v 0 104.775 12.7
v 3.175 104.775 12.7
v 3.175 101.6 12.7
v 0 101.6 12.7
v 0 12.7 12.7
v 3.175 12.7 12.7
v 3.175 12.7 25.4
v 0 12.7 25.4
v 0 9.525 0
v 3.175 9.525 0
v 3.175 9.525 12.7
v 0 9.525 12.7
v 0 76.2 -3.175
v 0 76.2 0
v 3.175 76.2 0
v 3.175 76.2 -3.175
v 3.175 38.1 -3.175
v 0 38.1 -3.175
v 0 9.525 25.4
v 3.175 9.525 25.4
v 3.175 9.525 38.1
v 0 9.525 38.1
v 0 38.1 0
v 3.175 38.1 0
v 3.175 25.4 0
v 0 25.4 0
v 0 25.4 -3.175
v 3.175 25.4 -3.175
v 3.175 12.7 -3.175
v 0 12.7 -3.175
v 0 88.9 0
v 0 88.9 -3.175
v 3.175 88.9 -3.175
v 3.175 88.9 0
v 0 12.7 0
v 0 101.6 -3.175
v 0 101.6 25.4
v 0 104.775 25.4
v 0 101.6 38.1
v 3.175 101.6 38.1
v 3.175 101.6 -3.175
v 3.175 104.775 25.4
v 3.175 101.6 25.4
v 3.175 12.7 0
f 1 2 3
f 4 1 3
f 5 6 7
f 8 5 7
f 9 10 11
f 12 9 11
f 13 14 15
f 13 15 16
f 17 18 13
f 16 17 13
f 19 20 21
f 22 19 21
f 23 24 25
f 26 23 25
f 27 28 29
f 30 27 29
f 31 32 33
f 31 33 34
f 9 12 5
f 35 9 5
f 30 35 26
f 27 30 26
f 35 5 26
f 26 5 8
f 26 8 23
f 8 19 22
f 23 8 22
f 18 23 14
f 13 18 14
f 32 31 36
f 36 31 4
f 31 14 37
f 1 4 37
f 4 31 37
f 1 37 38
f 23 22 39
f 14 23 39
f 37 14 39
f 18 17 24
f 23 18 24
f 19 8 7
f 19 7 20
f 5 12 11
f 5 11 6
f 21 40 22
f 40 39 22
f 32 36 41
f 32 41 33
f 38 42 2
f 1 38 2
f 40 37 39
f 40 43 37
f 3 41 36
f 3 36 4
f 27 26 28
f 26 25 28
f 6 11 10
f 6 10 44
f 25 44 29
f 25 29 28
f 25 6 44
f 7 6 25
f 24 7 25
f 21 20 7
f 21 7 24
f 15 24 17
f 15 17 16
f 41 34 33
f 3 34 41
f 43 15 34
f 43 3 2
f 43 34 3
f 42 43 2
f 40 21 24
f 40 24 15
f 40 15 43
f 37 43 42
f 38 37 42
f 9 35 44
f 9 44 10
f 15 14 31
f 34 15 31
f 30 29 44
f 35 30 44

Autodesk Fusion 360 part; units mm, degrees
sketch "Sketch1" plane through (0, 0, 0) normal (1, 0, 0) x (0, 1, 0)
  line L0 (0, 0) -> (101.6, 0)
  line L1 (101.6, 0) -> (101.6, 38.1)
  line L2 (101.6, 38.1) -> (0, 38.1)
  line L3 (0, 38.1) -> (0, 0)
  line L4 (0, 0) -> (0, -3.175)
  line L5 (0, -3.175) -> (12.7, -3.175)
  line L6 (12.7, -3.175) -> (12.7, 0)
  line L7 (12.7, 0) -> (25.4, 0)
  line L8 (25.4, 0) -> (25.4, -3.175)
  line L9 (25.4, -3.175) -> (38.1, -3.175)
  line L10 (38.1, -3.175) -> (38.1, 0)
  line L11 (101.6, 0) -> (101.6, -3.175)
  line L12 (101.6, -3.175) -> (88.9, -3.175)
  line L13 (88.9, -3.175) -> (88.9, 0)
  line L14 (88.9, 0) -> (76.2, 0)
  line L15 (76.2, 0) -> (76.2, -3.175)
  line L16 (76.2, -3.175) -> (63.5, -3.175)
  line L17 (63.5, -3.175) -> (63.5, 0)
  line L18 (101.6, 0) -> (104.775, 0)
  line L19 (104.775, 0) -> (104.775, 12.7)
  line L20 (104.775, 12.7) -> (101.6, 12.7)
  line L21 (101.6, 38.1) -> (104.775, 38.1)
  line L22 (104.775, 38.1) -> (104.775, 25.4)
  line L23 (104.775, 25.4) -> (101.6, 25.4)
  line L24 (0, 38.1) -> (-3.175, 38.1)
  line L25 (-3.175, 38.1) -> (-3.175, 25.4)
  line L26 (-3.175, 25.4) -> (0, 25.4)
  line L27 (0, 0) -> (-3.175, 0)
  line L28 (-3.175, 0) -> (-3.175, 12.7)
  line L29 (-3.175, 12.7) -> (0, 12.7)
  dimension "d1" = 101.6
  dimension "d2" = 38.1
  dimension "d3" = 3.175
  dimension "d4" = 12.7
  dimension "d5" = 12.7
  dimension "d6" = 3.175
  dimension "d7" = 12.7
  dimension "d8" = 3.175
  dimension "d9" = 12.7
  dimension "d10" = 12.7
  dimension "d11" = 3.175
  dimension "d12" = 12.7
  dimension "d13" = 3.175
  dimension "d14" = 12.7
  dimension "d15" = 3.175
  dimension "d16" = 12.7
  dimension "d17" = 3.175
  dimension "d18" = 12.7
  dimension "d19" = 3.175
  dimension "d20" = 12.7
extrude "Extrude1" add sketch "Sketch1" along normal blind 3.175
sketch "Sketch2" plane through (3.175, 0, 0) normal (1, 0, 0) x (0, 1, 0)
  line L0 (0, 0) -> (0, -3.175)
  line L1 (0, -3.175) -> (12.7, -3.175)
  line L2 (12.7, -3.175) -> (12.7, 0)
  line L3 (12.7, 0) -> (25.4, 0)
  line L4 (25.4, 0) -> (25.4, -3.175)
  line L5 (25.4, -3.175) -> (38.1, -3.175)
  line L6 (38.1, -3.175) -> (38.1, 0)
  line L7 (38.1, 0) -> (63.5, 0)
  line L8 (63.5, 0) -> (63.5, -3.175)
  line L9 (63.5, -3.175) -> (76.2, -3.175)
  line L10 (76.2, -3.175) -> (76.2, 0)
  line L11 (76.2, 0) -> (88.9, 0)
  line L12 (88.9, 0) -> (88.9, -3.175)
  line L13 (88.9, -3.175) -> (101.6, -3.175)
  line L14 (101.6, -3.175) -> (101.6, 0)
  line L15 (101.6, 0) -> (104.775, 0)
  line L16 (104.775, 0) -> (104.775, 12.7)
  line L17 (104.775, 12.7) -> (101.6, 12.7)
  line L18 (101.6, 12.7) -> (101.6, 25.4)
  line L19 (101.6, 25.4) -> (104.775, 25.4)
  line L20 (104.775, 25.4) -> (104.775, 38.1)
  line L21 (104.775, 38.1) -> (-3.175, 38.1)
  line L22 (-3.175, 38.1) -> (-3.175, 25.4)
  line L23 (-3.175, 25.4) -> (0, 25.4)
  line L24 (0, 25.4) -> (0, 12.7)
  line L25 (0, 12.7) -> (-3.175, 12.7)
  line L26 (-3.175, 12.7) -> (-3.175, 0)
  line L27 (-3.175, 0) -> (0, 0)
  line L28 (50.8, 0) -> (63.5, 0)
  line L29 (63.5, 0) -> (63.5, -3.175)
  line L30 (63.5, -3.175) -> (76.2, -3.175)
  line L31 (76.2, -3.175) -> (76.2, 0)
  line L32 (76.2, 0) -> (88.9, 0)
  line L33 (88.9, -3.175) -> (88.9, 0)
  line L34 (88.9, -3.175) -> (101.6, -3.175)
  line L35 (101.6, -3.175) -> (101.6, 0)
  line L36 (104.775, 0) -> (104.775, 12.7)
  line L37 (104.775, 12.7) -> (101.6, 12.7)
  line L38 (101.6, 12.7) -> (101.6, 25.4)
  line L39 (104.775, 25.4) -> (104.775, 38.1)
  line L40 (104.775, 38.1) -> (50.8, 38.1)
  line L41 (63.5, 0) -> (57.15, 0)
  line L42 (50.8, 38.1) -> (53.975, 38.1)
  line L43 (53.975, 38.1) -> (57.15, 38.1)
  line L44 (57.15, 38.1) -> (57.15, 0)
  line L45 (57.15, 38.1) -> (57.15, 0)
  line L46 (25.4, -3.175) -> (12.7, -3.175)
  line L47 (9.525, 25.4) -> (9.525, 38.1)
  line L48 (9.525, 12.7) -> (12.7, 12.7)
  line L49 (12.7, 12.7) -> (12.7, 25.4)
  line L50 (9.525, 0) -> (9.525, 12.7)
  line L51 (12.7, -3.175) -> (12.7, 0)
  line L52 (12.7, 0) -> (9.525, 0)
  line L53 (12.7, 25.4) -> (9.525, 25.4)
  line L54 (9.525, 12.7) -> (12.7, 12.7)
  line L55 (50.8, -3.175) -> (38.1, -3.175)
  line L56 (9.525, 0) -> (9.525, 12.7)
  line L57 (9.525, 25.4) -> (9.525, 38.1)
  line L58 (38.1, 0) -> (25.4, 0)
  line L59 (38.1, -3.175) -> (38.1, 0)
  line L60 (50.8, 0) -> (50.8, -3.175)
  line L61 (12.7, -3.175) -> (12.7, 0)
  line L62 (25.4, 0) -> (25.4, -3.175)
  line L63 (50.8, 0) -> (50.8, -3.175)
  line L64 (50.8, -3.175) -> (38.1, -3.175)
  line L65 (38.1, -3.175) -> (38.1, 0)
  line L66 (25.4, -3.175) -> (25.4, 0)
  line L67 (25.4, -3.175) -> (12.7, -3.175)
  line L68 (12.7, 12.7) -> (12.7, 25.4)
  line L69 (38.1, 0) -> (25.4, 0)
  line L70 (50.8, -3.175) -> (63.5, -3.175)
  point P0 (50.8, 0)
  dimension "d23" = 3.175
  dimension "d24" = 3.175
extrude "Extrude5" add sketch "Sketch2" against normal blind 3.175 contours L6 L7 L55 L59 L60 L63 L64 L65 | L7 L8 L28 L29 L41 L60 L63 L70
extrude "Extrude3" cut sketch "Sketch2" against normal blind 30.48 contours L0 L1 L2 L21 L22 L23 L24 L25 L26 L27 L47 L48 L49 L50 L51 L52 L53 L54 L56 L57 L61 L68
extrude "Extrude2" cut sketch "Sketch2" against normal blind 15.24 contours L0 L1 L2 L21 L22 L23 L24 L25 L26 L27 L47 L48 L49 L50 L51 L52 L53 L54 L56 L57 L61 L68 | L3 L7 L21 L28 L40 L42 L43 L44 L45 L47 L48 L49 L50 L52 L53 L54 L56 L57 L58 L68 L69 | L4 L5 L6 L58 L59 L62 L65 L66 L69
extrude "Extrude4" add sketch "Sketch2" against normal blind 3.175 contours L2 L3 L4 L46 L51 L61 L62 L66 L67 | L3 L7 L21 L28 L40 L42 L43 L44 L45 L47 L48 L49 L50 L52 L53 L54 L56 L57 L58 L68 L69 | L6 L7 L55 L59 L60 L63 L64 L65
sketch "Sketch3" plane through (3.175, 0, 0) normal (1, 0, 0) x (0, 1, 0)
  line L0 (38.1, -3.175) -> (76.2, -3.175)
  line L1 (76.2, -3.175) -> (76.2, 0)
  line L2 (76.2, 0) -> (88.9, 0)
  line L3 (88.9, 0) -> (88.9, -3.175)
  line L4 (88.9, -3.175) -> (101.6, -3.175)
  line L5 (101.6, -3.175) -> (101.6, 0)
  line L6 (101.6, 0) -> (104.775, 0)
  line L7 (104.775, 0) -> (104.775, 12.7)
  line L8 (104.775, 12.7) -> (101.6, 12.7)
  line L9 (101.6, 12.7) -> (101.6, 25.4)
  line L10 (101.6, 25.4) -> (104.775, 25.4)
  line L11 (104.775, 25.4) -> (104.775, 38.1)
  line L12 (104.775, 38.1) -> (9.525, 38.1)
  line L13 (9.525, 38.1) -> (9.525, 25.4)
  line L14 (9.525, 25.4) -> (12.7, 25.4)
  line L15 (12.7, 25.4) -> (12.7, 12.7)
  line L16 (12.7, 12.7) -> (9.525, 12.7)
  line L17 (9.525, 12.7) -> (9.525, 0)
  line L18 (9.525, 0) -> (12.7, 0)
  line L19 (12.7, 0) -> (12.7, -3.175)
  line L20 (12.7, -3.175) -> (25.4, -3.175)
  line L21 (25.4, -3.175) -> (25.4, 0)
  line L22 (25.4, 0) -> (38.1, 0)
  line L23 (38.1, 0) -> (38.1, -3.175)
  line L24 (12.7, 0) -> (12.7, -3.175)
  line L25 (12.7, -3.175) -> (25.4, -3.175)
  line L26 (25.4, -3.175) -> (25.4, 0)
  line L27 (38.1, 0) -> (25.4, 0)
  line L28 (38.1, 0) -> (38.1, -3.175)
  line L29 (38.1, -3.175) -> (76.2, -3.175)
  line L30 (76.2, 0) -> (76.2, -3.175)
  line L31 (76.2, 0) -> (88.9, 0)
  line L32 (88.9, -3.175) -> (88.9, 0)
  line L33 (88.9, -3.175) -> (101.6, -3.175)
  line L34 (101.6, -3.175) -> (101.6, 0)
  line L35 (101.6, 0) -> (104.775, 0)
  line L36 (104.775, 0) -> (104.775, 12.7)
  line L37 (104.775, 12.7) -> (101.6, 12.7)
  line L38 (101.6, 12.7) -> (101.6, 25.4)
  line L39 (101.6, 25.4) -> (104.775, 25.4)
  line L40 (104.775, 25.4) -> (104.775, 38.1)
  line L41 (104.775, 38.1) -> (9.525, 38.1)
  line L42 (9.525, 38.1) -> (9.525, 25.4)
  line L43 (9.525, 25.4) -> (12.7, 25.4)
  line L44 (12.7, 25.4) -> (12.7, 12.7)
  line L45 (12.7, 12.7) -> (9.525, 12.7)
  line L46 (9.525, 12.7) -> (9.525, 0)
  line L47 (9.525, 0) -> (12.7, 0)
sketch "Sketch4" plane through (3.175, 0, 0) normal (1, 0, 0) x (0, 1, 0)
  line L0 (38.1, -3.175) -> (76.2, -3.175)
  line L1 (76.2, -3.175) -> (76.2, 0)
  line L2 (76.2, 0) -> (88.9, 0)
  line L3 (88.9, 0) -> (88.9, -3.175)
  line L4 (88.9, -3.175) -> (101.6, -3.175)
  line L5 (101.6, -3.175) -> (101.6, 0)
  line L6 (101.6, 0) -> (104.775, 0)
  line L7 (104.775, 0) -> (104.775, 12.7)
  line L8 (104.775, 12.7) -> (101.6, 12.7)
  line L9 (101.6, 12.7) -> (101.6, 25.4)
  line L10 (101.6, 25.4) -> (104.775, 25.4)
  line L11 (104.775, 25.4) -> (104.775, 38.1)
  line L12 (104.775, 38.1) -> (9.525, 38.1)
  line L13 (9.525, 38.1) -> (9.525, 25.4)
  line L14 (9.525, 25.4) -> (12.7, 25.4)
  line L15 (12.7, 25.4) -> (12.7, 12.7)
  line L16 (12.7, 12.7) -> (9.525, 12.7)
  line L17 (9.525, 12.7) -> (9.525, 0)
  line L18 (9.525, 0) -> (12.7, 0)
  line L19 (12.7, 0) -> (12.7, -3.175)
  line L20 (12.7, -3.175) -> (25.4, -3.175)
  line L21 (25.4, -3.175) -> (25.4, 0)
  line L22 (25.4, 0) -> (38.1, 0)
  line L23 (38.1, 0) -> (38.1, -3.175)
  line L24 (101.6, 12.7) -> (104.775, 12.7)
  line L25 (104.775, 25.4) -> (104.775, 12.7)
  line L26 (104.775, 25.4) -> (101.6, 25.4)
  line L27 (101.6, 25.4) -> (101.6, 12.7)
  line L28 (101.6, 25.4) -> (101.6, 38.1)
  line L29 (101.6, 38.1) -> (104.775, 38.1)
  line L30 (104.775, 38.1) -> (104.775, 0)
  line L31 (104.775, 0) -> (101.6, 0)
  line L32 (101.6, 0) -> (101.6, 25.4)
extrude "Extrude7" cut sketch "Sketch4" against normal blind 5.08 contours L6 L7 L8 L24 L30 L31 L32 | L10 L11 L12 L26 L28 L29 L30
extrude "Extrude6" cut sketch "Sketch4" against normal blind 20.32 contours L6 L7 L8 L24 L30 L31 L32 | L10 L11 L12 L26 L28 L29 L30
extrude "Extrude8" add sketch "Sketch4" against normal blind 3.175 contours L8 L9 L10 L24 L25 L26 L27 L30 L32
